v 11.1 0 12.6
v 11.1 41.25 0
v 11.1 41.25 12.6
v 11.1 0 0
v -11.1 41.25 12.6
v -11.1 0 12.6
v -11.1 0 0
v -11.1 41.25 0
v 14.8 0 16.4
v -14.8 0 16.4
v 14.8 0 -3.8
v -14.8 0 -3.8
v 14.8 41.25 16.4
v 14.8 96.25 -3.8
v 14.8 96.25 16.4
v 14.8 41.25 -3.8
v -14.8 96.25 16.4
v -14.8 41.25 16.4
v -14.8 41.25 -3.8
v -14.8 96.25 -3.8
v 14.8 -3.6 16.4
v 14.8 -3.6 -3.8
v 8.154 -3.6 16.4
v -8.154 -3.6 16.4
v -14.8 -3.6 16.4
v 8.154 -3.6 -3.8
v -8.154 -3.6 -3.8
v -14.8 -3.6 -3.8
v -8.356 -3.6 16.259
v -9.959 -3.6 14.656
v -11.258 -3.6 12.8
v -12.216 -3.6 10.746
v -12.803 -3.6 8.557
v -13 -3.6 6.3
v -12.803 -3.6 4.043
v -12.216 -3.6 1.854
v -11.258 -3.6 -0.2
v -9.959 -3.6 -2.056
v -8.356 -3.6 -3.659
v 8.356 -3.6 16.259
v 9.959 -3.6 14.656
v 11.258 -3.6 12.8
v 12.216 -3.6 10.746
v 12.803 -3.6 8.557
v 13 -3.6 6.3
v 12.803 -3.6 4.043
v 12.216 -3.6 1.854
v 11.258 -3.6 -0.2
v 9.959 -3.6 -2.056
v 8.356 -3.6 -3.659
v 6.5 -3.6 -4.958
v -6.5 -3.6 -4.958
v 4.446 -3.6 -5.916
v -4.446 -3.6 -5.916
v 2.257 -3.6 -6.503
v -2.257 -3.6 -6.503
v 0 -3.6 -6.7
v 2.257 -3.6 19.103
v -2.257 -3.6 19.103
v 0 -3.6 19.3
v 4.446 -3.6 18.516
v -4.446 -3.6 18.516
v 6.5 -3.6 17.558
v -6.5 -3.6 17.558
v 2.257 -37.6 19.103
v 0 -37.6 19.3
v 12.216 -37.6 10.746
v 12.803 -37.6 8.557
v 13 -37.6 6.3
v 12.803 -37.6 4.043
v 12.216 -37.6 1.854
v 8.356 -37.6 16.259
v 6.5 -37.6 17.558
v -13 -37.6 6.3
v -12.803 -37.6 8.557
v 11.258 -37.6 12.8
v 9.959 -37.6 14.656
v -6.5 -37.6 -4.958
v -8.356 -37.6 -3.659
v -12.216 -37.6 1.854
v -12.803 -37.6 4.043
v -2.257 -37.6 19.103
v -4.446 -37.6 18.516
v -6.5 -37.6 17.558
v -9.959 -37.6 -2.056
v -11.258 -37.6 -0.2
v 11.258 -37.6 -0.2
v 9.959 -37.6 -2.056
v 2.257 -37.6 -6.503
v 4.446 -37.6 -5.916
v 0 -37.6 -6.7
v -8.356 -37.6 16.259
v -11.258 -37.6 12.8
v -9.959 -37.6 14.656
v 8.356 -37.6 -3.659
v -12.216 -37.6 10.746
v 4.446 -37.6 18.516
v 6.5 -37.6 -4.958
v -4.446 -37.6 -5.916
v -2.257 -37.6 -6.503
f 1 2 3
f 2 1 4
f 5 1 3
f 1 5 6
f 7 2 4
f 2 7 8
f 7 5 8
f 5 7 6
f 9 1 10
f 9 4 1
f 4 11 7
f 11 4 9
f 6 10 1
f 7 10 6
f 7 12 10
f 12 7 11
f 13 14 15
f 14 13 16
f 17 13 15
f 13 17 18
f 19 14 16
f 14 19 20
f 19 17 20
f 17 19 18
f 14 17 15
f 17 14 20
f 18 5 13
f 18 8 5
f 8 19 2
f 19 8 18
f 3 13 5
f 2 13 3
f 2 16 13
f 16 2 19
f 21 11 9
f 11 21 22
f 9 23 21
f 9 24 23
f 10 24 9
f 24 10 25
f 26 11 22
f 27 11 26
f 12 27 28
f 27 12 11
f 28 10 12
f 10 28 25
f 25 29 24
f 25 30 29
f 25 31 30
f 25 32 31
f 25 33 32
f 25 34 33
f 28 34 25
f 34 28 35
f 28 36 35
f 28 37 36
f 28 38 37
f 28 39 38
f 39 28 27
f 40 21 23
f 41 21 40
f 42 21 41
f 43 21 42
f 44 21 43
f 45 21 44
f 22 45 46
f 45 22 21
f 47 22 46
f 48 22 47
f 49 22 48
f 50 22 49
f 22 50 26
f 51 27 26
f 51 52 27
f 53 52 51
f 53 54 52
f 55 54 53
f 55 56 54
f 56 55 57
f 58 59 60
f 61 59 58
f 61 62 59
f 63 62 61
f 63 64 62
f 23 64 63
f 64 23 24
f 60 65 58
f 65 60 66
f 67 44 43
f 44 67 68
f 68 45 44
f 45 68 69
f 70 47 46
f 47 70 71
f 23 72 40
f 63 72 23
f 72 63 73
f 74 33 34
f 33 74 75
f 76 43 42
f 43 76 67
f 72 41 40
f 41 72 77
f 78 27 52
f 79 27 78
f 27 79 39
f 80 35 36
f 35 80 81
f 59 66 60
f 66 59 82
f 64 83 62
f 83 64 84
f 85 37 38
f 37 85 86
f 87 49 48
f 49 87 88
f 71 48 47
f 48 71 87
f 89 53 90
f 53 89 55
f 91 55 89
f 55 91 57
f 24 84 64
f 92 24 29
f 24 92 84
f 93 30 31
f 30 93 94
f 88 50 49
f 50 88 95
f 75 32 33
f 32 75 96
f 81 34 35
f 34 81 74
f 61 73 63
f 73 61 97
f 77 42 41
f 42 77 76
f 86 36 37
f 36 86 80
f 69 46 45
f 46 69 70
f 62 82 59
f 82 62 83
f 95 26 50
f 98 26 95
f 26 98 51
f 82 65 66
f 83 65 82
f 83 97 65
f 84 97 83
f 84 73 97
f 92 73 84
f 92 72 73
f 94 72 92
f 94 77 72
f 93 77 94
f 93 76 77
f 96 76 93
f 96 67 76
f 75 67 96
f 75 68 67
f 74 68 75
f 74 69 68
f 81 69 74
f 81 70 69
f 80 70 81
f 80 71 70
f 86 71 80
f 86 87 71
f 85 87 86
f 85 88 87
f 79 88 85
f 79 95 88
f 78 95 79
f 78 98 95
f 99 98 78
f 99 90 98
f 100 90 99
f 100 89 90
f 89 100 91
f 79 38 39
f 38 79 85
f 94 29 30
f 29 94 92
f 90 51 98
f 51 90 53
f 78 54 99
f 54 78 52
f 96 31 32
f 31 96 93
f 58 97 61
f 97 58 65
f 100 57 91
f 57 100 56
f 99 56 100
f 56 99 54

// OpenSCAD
$fn=36; // set to 360 for final render

debug=true;
show_mount=true;

// my extension of the concept
module roundedCube(xdim, ydim, zdim, rdim) {
  hull() {
    translate([rdim,rdim,rdim]) sphere(r=rdim);
    translate([xdim-rdim,rdim,rdim]) sphere(r=rdim);
    translate([rdim,ydim-rdim,rdim]) sphere(r=rdim);
    translate([xdim-rdim,ydim-rdim,rdim]) sphere(r=rdim);
    translate([rdim,rdim,zdim-rdim]) sphere(r=rdim);
    translate([xdim-rdim,rdim,zdim-rdim]) sphere(r=rdim);
    translate([rdim,ydim-rdim,zdim-rdim]) sphere(r=rdim);
    translate([xdim-rdim,ydim-rdim,zdim-rdim]) sphere(r=rdim);
  }
};
//roundedCube(40,30,20,2);

// mount_foot_width=70+3;//test print done at 70
// mount_foot_depth=600;//test print done at 600
// mount_foot_height=20+3;//test print done at 20

// mount_leg_width=50;
// mount_leg_depth=80;
// mount_leg_height=900;

bracket_thickness=10;

radius=1;

inner_shaft_width=22.2;
inner_shaft_height=12.6;
inner_shaft_depth=55;
outer_shaft_width=29.6;
outer_shaft_height=20.2;
outer_shaft_depth=55;
outer_lip_depth=3.6;
outer_shaft_height_offset=(outer_shaft_height-inner_shaft_height)/2;
joint_depth=34;
joint_circumference=26;
joint_radius=joint_circumference/2;
if (debug){
  echo("inner_shaft_width", inner_shaft_width);
  echo("inner_shaft_height", inner_shaft_height);
  echo("inner_shaft_depth", inner_shaft_depth);
  echo("outer_shaft_width", outer_shaft_width);
  echo("outer_shaft_height", outer_shaft_height);
  echo("outer_shaft_depth", outer_shaft_depth);
  echo("outer_lip_depth", outer_lip_depth);
  echo("outer_shaft_height_offset", outer_shaft_height_offset);
  echo("joint_depth", joint_depth);
  echo("joint_circumference", joint_circumference);
  echo("joint_radius", joint_radius);
}

module mount() {
  // inner shaft
  translate([-inner_shaft_width/2,0,0]) 
    cube([inner_shaft_width,inner_shaft_depth,inner_shaft_height]);
  // outer shaft
  translate([-outer_shaft_width/2,outer_shaft_depth*3/4,-outer_shaft_height_offset]) 
    cube([outer_shaft_width,outer_shaft_depth,outer_shaft_height]);
  // outer front lip
  translate([-outer_shaft_width/2,-outer_lip_depth,-outer_shaft_height_offset]) 
    cube([outer_shaft_width,outer_lip_depth,outer_shaft_height]);
  // ball joint placeholder
  translate([0,-outer_lip_depth,inner_shaft_height/2])
    rotate([90,0,0])
      cylinder(h = joint_depth, r = joint_radius);
    //cube([outer_shaft_width,outer_shaft_depth,outer_shaft_height]);
  //   translate([bracket_thickness+half_width_delta,-1/8*table_foot_depth,bracket_thickness]) {
  //   color("Blue") {
  //     cube([table_foot_width,table_foot_depth,table_foot_height]);
  //     //translate([bracket_thickness,(table_foot_depth/2)-(table_leg_depth/2),0])
  //     //  cube([table_leg_width,table_leg_depth,table_leg_height]);
  //   }
  // }
}

module bracket() {
  // module bracketside() {
  //   roundedCube(
  //     bracket_thickness,
  //     //battery_depth+2*bracket_thickness,
  //     2.5*bracket_thickness,
  //     table_foot_height+2*bracket_thickness,
  //     radius);
  // }
  // module bracketface() {
  //   roundedCube(
  //     table_foot_width+2*bracket_thickness,
  //     //battery_depth+2*bracket_thickness,
  //     2.5*bracket_thickness,
  //     bracket_thickness,
  //     radius);
  // }
  // /*translate([half_width_delta,0,0])*/{
  //   bracketside();
  //   translate([bracket_thickness+table_foot_width,0,0]) bracketside();
  //   bracketface();
  //   translate([0,0,bracket_thickness+table_foot_height]) bracketface();
  // }
}

if (show_mount) {
  mount();
}
module brace() {
  //bracket();
}
brace();
//cube([inner_shaft_width,inner_shaft_depth,inner_shaft_height]);
